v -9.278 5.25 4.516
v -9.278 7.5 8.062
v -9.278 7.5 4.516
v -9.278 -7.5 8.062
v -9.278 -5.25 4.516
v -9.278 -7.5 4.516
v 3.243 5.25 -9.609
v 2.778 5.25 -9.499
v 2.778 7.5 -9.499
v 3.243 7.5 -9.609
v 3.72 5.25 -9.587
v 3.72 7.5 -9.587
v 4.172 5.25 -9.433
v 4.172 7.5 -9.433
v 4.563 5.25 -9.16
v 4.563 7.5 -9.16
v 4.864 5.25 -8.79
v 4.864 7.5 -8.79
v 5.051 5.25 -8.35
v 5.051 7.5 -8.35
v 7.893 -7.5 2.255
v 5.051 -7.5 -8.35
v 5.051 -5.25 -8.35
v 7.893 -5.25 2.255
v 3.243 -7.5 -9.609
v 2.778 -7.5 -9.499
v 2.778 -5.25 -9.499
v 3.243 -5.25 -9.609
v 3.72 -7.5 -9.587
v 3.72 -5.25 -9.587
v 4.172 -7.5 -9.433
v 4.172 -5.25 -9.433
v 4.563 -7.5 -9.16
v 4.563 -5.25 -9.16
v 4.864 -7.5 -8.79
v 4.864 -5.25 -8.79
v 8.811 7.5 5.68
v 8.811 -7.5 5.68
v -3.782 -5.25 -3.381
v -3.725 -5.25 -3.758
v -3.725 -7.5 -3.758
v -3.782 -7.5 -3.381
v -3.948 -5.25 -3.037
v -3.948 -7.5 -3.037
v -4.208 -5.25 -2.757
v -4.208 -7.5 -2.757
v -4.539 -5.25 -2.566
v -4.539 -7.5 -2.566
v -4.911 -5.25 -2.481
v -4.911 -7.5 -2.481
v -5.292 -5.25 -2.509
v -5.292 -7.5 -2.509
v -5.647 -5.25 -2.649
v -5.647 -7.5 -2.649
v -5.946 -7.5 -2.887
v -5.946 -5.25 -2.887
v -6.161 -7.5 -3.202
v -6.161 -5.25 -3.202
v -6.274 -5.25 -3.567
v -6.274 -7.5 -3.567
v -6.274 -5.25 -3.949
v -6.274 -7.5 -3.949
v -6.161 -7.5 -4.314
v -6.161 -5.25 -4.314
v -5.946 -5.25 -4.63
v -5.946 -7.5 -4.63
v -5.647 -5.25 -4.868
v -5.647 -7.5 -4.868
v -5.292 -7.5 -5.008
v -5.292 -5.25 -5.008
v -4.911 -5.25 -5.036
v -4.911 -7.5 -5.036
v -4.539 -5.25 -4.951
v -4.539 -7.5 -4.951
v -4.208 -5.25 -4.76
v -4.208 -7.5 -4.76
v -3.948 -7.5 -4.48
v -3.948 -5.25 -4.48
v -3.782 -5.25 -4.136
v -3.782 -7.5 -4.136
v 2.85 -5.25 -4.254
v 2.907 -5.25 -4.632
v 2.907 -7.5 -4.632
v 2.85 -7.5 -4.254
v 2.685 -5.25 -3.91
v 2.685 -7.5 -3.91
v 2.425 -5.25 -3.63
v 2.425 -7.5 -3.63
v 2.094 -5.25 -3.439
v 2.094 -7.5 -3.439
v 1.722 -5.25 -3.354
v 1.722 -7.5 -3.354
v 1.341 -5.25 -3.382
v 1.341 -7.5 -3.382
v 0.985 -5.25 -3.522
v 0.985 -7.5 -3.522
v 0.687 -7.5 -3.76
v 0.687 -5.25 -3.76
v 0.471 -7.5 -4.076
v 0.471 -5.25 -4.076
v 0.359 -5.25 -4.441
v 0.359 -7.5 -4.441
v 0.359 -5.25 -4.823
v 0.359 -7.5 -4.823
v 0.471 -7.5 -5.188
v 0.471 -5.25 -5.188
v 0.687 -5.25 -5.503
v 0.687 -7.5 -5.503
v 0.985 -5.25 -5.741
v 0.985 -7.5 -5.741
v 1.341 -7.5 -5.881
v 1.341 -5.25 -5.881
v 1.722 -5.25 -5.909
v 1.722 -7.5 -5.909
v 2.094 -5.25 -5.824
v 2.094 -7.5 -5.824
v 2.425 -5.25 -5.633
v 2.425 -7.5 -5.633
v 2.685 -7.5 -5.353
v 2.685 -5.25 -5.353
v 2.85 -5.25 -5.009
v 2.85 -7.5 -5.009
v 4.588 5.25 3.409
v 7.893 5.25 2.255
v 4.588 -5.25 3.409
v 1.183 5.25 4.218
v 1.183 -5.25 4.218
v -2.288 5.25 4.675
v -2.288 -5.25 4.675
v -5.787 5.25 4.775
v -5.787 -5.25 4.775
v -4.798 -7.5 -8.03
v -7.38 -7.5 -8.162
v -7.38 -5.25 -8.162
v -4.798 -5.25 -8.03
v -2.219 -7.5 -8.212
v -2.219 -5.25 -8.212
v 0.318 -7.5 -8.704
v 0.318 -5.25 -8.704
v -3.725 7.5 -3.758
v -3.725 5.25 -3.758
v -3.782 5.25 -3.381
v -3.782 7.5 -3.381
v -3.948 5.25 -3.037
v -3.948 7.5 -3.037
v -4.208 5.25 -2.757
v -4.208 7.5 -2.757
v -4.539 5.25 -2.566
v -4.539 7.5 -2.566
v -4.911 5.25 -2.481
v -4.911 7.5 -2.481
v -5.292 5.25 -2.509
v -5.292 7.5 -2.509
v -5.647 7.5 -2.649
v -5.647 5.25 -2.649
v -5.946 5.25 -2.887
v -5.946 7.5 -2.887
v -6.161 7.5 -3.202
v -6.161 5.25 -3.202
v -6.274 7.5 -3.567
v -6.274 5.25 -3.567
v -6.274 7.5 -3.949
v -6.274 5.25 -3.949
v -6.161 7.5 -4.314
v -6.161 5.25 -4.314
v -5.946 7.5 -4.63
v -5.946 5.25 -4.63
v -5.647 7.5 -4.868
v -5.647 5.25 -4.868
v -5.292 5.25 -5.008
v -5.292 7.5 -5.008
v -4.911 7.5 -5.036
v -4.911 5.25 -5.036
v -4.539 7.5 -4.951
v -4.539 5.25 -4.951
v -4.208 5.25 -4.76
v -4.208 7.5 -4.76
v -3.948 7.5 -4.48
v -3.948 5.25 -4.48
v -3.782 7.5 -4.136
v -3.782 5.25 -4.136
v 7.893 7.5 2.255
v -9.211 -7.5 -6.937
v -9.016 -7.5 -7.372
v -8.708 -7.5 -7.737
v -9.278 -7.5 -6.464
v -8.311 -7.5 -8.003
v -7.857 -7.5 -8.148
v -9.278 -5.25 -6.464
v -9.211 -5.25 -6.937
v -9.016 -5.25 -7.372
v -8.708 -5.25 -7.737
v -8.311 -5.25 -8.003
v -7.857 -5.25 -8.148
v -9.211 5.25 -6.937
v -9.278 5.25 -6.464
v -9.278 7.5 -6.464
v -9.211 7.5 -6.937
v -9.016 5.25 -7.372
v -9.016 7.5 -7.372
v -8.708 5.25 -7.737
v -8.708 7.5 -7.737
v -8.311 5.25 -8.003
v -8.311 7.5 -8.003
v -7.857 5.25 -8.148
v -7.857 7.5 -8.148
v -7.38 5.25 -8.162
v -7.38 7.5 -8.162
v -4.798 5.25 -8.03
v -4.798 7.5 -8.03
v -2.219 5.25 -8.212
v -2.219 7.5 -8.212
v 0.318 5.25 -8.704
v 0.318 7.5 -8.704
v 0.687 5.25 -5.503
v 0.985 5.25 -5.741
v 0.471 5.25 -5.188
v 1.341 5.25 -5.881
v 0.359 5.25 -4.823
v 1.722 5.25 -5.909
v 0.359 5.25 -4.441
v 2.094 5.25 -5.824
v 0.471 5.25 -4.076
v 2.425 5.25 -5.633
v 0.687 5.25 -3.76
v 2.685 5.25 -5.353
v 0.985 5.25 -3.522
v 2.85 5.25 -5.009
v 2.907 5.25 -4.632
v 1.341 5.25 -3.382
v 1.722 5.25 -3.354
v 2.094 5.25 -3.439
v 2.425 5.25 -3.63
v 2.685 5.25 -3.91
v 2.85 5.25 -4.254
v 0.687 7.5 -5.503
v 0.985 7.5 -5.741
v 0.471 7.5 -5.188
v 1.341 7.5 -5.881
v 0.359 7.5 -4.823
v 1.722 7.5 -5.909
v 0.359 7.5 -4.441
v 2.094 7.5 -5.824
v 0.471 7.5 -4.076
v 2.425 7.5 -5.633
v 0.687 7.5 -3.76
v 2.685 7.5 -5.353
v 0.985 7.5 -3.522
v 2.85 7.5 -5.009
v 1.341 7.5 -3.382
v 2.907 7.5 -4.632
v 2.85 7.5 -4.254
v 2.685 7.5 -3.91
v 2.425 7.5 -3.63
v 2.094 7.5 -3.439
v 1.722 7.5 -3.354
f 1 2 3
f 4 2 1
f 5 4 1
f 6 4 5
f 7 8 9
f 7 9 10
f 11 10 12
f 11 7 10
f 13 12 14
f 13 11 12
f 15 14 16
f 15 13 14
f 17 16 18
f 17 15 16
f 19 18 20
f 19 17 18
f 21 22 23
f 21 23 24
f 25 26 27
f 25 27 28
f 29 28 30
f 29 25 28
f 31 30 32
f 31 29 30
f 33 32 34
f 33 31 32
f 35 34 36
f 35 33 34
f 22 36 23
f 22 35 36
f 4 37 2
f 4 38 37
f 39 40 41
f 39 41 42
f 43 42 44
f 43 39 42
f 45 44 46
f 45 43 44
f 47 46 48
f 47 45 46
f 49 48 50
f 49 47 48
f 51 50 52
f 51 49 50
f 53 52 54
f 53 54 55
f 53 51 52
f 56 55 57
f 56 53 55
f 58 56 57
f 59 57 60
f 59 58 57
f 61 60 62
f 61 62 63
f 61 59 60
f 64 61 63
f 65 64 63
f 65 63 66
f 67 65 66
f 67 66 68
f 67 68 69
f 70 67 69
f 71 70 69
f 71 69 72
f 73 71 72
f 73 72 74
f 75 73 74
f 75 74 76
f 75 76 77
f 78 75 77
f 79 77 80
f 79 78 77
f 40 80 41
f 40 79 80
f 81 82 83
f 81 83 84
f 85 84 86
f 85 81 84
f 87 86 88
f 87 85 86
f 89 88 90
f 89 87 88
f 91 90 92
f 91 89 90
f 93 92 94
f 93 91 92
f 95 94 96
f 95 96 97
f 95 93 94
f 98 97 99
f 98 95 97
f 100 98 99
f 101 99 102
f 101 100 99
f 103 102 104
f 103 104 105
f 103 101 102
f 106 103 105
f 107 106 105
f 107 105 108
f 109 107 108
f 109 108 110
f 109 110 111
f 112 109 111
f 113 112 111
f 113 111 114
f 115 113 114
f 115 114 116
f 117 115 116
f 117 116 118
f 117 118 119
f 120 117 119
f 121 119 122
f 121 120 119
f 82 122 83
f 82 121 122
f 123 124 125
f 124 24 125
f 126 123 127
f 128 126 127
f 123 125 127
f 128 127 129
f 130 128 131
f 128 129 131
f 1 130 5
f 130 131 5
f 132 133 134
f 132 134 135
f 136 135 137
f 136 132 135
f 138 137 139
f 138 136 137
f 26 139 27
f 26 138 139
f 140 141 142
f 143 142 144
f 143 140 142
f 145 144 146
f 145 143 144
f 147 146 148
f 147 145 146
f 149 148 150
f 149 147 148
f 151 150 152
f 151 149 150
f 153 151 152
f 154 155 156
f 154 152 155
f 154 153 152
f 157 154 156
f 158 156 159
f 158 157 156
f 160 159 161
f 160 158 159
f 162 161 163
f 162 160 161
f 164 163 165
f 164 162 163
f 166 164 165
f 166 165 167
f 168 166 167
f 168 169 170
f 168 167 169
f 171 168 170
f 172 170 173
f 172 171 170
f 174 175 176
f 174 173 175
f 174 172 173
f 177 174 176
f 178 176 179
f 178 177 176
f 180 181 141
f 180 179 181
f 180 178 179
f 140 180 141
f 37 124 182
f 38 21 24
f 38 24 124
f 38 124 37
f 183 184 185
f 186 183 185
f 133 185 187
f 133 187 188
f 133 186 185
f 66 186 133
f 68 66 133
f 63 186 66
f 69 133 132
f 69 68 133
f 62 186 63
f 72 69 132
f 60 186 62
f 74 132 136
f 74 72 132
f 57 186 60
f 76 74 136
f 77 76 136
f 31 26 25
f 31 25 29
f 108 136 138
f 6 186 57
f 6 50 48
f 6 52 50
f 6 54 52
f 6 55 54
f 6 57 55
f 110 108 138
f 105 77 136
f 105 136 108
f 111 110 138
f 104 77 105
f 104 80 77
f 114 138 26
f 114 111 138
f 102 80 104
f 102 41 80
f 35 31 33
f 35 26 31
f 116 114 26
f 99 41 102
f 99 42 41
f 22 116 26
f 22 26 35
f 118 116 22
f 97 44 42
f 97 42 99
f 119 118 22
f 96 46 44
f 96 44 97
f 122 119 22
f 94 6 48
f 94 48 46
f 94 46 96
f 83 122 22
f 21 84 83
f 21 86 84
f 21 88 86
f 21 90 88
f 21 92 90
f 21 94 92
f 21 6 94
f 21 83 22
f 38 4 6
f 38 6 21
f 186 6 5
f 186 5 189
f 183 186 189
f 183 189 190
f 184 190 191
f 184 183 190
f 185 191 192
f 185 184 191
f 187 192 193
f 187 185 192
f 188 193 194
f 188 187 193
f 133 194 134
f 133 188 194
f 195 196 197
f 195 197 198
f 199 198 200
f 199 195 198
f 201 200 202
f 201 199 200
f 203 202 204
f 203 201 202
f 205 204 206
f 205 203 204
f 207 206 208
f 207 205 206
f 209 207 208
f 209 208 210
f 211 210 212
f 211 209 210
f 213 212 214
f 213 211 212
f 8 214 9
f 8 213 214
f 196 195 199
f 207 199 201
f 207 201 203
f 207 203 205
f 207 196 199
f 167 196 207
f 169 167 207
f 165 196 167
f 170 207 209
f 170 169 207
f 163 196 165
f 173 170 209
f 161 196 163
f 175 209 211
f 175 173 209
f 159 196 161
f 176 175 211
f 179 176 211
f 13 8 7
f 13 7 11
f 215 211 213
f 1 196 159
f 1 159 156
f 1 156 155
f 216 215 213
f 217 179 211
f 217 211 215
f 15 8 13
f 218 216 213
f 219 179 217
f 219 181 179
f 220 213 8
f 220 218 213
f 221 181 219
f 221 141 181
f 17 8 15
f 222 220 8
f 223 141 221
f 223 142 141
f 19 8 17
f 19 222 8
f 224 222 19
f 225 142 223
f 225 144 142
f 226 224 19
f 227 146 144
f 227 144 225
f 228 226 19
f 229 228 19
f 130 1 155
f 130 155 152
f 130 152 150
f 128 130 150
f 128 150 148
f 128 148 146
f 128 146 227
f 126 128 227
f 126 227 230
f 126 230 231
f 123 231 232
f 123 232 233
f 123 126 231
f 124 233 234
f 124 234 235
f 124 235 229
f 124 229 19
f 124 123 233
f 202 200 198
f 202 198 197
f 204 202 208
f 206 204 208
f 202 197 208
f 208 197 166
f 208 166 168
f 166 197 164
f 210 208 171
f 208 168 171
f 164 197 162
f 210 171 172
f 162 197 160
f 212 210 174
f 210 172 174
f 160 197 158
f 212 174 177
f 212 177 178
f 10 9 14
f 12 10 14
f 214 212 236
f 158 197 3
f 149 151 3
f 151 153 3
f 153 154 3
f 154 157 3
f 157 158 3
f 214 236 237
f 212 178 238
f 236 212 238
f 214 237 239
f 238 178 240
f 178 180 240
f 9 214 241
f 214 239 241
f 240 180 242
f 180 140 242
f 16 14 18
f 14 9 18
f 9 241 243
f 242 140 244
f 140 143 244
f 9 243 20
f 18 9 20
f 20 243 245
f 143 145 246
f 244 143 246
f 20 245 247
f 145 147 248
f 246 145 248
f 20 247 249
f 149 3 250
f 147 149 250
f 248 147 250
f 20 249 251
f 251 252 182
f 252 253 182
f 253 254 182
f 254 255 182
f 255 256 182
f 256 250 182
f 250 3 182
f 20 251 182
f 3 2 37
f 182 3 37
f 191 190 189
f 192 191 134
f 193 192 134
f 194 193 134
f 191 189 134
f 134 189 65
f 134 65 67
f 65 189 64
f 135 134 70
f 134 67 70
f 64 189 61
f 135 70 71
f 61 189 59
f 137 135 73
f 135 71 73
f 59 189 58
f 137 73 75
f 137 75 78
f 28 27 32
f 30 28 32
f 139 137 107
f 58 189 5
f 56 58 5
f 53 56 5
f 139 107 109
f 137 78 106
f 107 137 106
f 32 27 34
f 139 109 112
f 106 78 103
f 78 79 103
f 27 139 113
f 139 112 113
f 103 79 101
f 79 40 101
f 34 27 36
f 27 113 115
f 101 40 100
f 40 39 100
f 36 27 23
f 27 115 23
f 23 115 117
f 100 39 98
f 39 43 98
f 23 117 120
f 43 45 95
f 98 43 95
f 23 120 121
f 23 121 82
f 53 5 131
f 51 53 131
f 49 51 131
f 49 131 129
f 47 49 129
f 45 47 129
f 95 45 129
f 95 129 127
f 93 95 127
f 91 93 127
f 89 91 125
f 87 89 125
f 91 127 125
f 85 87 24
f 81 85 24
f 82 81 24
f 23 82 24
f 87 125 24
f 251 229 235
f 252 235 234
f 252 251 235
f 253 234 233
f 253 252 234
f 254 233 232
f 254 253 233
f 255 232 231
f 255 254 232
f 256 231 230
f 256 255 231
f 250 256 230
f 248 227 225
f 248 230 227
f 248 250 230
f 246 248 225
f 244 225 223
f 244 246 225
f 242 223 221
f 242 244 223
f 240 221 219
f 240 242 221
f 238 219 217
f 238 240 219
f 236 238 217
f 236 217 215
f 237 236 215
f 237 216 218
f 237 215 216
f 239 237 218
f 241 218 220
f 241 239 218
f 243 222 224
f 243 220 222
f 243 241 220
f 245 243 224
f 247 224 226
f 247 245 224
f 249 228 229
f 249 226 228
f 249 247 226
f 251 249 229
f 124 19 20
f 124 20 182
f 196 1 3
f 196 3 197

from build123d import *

# Parameters (mm, degrees)
F0_R     = 1.2813159657
F1_DEPTH = 7.5
F2_DEPTH = 5.25


# Not quite as in the source:
# - ends of sketch curves that miss each other by under 0.0002 mm in the source are joined


with BuildPart() as f1:
    # F0 (on Front) → F1 (new body, symmetric)
    with BuildSketch(Plane.XZ):
        with BuildLine():
            ThreePointArc((7.8928847665, 2.2551549829), (-0.5468394213, 4.4913902739), (-9.2777672646, 4.515713911))
            Line((-9.2777672646, 4.515713911), (-9.27776646, -6.4638420574))
            ThreePointArc((-9.27776646, -6.4638420574), (-8.7082936227, -7.7372240383), (-7.3795216285, -8.1616848044))
            ThreePointArc((-7.3795216285, -8.1616848044), (-2.2192897787, -8.212150504), (2.7781677389, -9.4989699664))
            ThreePointArc((2.7781677389, -9.4989699664), (4.1715212346, -9.432884372), (5.0511658084, -8.3502824825))
            Line((5.0511658084, -8.3502824825), (7.8928847665, 2.2551549829))
        make_face()
        with Locations((-5.0067132411, -3.7583980654)):
            Circle(F0_R, mode=Mode.SUBTRACT)
        with Locations((1.6258659514, -4.6315961033)):
            Circle(F0_R, mode=Mode.SUBTRACT)
        with BuildLine():
            Line((8.8106123745, 5.6801667894), (-9.27776646, 8.0615492201))
            Line((-9.27776646, 8.0615492201), (-9.27776646, 4.515713911))
            ThreePointArc((-9.27776646, 4.515713911), (-0.5468394213, 4.4913902739), (7.8928847665, 2.2551549829))
            Line((7.8928847665, 2.2551549829), (8.8106123745, 5.6801667894))
        make_face()
    extrude(amount=F1_DEPTH, both=True)

    # F0 (on Front) → F2 (cut, symmetric)
    with BuildSketch(Plane.XZ):
        with BuildLine():
            ThreePointArc((7.8928847665, 2.2551549829), (-0.5468394213, 4.4913902739), (-9.2777672646, 4.515713911))
            Line((-9.2777672646, 4.515713911), (-9.27776646, -6.4638420574))
            ThreePointArc((-9.27776646, -6.4638420574), (-8.7082936227, -7.7372240383), (-7.3795216285, -8.1616848044))
            ThreePointArc((-7.3795216285, -8.1616848044), (-2.2192897787, -8.212150504), (2.7781677389, -9.4989699664))
            ThreePointArc((2.7781677389, -9.4989699664), (4.1715212346, -9.432884372), (5.0511658084, -8.3502824825))
            Line((5.0511658084, -8.3502824825), (7.8928847665, 2.2551549829))
        make_face()
        with Locations((-5.0067132411, -3.7583980654)):
            Circle(F0_R, mode=Mode.SUBTRACT)
        with Locations((1.6258659514, -4.6315961033)):
            Circle(F0_R, mode=Mode.SUBTRACT)
        with Locations((-5.0067132411, -3.7583980654)):
            Circle(F0_R)
        with Locations((1.6258659514, -4.6315961033)):
            Circle(F0_R)
    extrude(amount=F2_DEPTH, both=True, mode=Mode.SUBTRACT)


solid = f1.part
